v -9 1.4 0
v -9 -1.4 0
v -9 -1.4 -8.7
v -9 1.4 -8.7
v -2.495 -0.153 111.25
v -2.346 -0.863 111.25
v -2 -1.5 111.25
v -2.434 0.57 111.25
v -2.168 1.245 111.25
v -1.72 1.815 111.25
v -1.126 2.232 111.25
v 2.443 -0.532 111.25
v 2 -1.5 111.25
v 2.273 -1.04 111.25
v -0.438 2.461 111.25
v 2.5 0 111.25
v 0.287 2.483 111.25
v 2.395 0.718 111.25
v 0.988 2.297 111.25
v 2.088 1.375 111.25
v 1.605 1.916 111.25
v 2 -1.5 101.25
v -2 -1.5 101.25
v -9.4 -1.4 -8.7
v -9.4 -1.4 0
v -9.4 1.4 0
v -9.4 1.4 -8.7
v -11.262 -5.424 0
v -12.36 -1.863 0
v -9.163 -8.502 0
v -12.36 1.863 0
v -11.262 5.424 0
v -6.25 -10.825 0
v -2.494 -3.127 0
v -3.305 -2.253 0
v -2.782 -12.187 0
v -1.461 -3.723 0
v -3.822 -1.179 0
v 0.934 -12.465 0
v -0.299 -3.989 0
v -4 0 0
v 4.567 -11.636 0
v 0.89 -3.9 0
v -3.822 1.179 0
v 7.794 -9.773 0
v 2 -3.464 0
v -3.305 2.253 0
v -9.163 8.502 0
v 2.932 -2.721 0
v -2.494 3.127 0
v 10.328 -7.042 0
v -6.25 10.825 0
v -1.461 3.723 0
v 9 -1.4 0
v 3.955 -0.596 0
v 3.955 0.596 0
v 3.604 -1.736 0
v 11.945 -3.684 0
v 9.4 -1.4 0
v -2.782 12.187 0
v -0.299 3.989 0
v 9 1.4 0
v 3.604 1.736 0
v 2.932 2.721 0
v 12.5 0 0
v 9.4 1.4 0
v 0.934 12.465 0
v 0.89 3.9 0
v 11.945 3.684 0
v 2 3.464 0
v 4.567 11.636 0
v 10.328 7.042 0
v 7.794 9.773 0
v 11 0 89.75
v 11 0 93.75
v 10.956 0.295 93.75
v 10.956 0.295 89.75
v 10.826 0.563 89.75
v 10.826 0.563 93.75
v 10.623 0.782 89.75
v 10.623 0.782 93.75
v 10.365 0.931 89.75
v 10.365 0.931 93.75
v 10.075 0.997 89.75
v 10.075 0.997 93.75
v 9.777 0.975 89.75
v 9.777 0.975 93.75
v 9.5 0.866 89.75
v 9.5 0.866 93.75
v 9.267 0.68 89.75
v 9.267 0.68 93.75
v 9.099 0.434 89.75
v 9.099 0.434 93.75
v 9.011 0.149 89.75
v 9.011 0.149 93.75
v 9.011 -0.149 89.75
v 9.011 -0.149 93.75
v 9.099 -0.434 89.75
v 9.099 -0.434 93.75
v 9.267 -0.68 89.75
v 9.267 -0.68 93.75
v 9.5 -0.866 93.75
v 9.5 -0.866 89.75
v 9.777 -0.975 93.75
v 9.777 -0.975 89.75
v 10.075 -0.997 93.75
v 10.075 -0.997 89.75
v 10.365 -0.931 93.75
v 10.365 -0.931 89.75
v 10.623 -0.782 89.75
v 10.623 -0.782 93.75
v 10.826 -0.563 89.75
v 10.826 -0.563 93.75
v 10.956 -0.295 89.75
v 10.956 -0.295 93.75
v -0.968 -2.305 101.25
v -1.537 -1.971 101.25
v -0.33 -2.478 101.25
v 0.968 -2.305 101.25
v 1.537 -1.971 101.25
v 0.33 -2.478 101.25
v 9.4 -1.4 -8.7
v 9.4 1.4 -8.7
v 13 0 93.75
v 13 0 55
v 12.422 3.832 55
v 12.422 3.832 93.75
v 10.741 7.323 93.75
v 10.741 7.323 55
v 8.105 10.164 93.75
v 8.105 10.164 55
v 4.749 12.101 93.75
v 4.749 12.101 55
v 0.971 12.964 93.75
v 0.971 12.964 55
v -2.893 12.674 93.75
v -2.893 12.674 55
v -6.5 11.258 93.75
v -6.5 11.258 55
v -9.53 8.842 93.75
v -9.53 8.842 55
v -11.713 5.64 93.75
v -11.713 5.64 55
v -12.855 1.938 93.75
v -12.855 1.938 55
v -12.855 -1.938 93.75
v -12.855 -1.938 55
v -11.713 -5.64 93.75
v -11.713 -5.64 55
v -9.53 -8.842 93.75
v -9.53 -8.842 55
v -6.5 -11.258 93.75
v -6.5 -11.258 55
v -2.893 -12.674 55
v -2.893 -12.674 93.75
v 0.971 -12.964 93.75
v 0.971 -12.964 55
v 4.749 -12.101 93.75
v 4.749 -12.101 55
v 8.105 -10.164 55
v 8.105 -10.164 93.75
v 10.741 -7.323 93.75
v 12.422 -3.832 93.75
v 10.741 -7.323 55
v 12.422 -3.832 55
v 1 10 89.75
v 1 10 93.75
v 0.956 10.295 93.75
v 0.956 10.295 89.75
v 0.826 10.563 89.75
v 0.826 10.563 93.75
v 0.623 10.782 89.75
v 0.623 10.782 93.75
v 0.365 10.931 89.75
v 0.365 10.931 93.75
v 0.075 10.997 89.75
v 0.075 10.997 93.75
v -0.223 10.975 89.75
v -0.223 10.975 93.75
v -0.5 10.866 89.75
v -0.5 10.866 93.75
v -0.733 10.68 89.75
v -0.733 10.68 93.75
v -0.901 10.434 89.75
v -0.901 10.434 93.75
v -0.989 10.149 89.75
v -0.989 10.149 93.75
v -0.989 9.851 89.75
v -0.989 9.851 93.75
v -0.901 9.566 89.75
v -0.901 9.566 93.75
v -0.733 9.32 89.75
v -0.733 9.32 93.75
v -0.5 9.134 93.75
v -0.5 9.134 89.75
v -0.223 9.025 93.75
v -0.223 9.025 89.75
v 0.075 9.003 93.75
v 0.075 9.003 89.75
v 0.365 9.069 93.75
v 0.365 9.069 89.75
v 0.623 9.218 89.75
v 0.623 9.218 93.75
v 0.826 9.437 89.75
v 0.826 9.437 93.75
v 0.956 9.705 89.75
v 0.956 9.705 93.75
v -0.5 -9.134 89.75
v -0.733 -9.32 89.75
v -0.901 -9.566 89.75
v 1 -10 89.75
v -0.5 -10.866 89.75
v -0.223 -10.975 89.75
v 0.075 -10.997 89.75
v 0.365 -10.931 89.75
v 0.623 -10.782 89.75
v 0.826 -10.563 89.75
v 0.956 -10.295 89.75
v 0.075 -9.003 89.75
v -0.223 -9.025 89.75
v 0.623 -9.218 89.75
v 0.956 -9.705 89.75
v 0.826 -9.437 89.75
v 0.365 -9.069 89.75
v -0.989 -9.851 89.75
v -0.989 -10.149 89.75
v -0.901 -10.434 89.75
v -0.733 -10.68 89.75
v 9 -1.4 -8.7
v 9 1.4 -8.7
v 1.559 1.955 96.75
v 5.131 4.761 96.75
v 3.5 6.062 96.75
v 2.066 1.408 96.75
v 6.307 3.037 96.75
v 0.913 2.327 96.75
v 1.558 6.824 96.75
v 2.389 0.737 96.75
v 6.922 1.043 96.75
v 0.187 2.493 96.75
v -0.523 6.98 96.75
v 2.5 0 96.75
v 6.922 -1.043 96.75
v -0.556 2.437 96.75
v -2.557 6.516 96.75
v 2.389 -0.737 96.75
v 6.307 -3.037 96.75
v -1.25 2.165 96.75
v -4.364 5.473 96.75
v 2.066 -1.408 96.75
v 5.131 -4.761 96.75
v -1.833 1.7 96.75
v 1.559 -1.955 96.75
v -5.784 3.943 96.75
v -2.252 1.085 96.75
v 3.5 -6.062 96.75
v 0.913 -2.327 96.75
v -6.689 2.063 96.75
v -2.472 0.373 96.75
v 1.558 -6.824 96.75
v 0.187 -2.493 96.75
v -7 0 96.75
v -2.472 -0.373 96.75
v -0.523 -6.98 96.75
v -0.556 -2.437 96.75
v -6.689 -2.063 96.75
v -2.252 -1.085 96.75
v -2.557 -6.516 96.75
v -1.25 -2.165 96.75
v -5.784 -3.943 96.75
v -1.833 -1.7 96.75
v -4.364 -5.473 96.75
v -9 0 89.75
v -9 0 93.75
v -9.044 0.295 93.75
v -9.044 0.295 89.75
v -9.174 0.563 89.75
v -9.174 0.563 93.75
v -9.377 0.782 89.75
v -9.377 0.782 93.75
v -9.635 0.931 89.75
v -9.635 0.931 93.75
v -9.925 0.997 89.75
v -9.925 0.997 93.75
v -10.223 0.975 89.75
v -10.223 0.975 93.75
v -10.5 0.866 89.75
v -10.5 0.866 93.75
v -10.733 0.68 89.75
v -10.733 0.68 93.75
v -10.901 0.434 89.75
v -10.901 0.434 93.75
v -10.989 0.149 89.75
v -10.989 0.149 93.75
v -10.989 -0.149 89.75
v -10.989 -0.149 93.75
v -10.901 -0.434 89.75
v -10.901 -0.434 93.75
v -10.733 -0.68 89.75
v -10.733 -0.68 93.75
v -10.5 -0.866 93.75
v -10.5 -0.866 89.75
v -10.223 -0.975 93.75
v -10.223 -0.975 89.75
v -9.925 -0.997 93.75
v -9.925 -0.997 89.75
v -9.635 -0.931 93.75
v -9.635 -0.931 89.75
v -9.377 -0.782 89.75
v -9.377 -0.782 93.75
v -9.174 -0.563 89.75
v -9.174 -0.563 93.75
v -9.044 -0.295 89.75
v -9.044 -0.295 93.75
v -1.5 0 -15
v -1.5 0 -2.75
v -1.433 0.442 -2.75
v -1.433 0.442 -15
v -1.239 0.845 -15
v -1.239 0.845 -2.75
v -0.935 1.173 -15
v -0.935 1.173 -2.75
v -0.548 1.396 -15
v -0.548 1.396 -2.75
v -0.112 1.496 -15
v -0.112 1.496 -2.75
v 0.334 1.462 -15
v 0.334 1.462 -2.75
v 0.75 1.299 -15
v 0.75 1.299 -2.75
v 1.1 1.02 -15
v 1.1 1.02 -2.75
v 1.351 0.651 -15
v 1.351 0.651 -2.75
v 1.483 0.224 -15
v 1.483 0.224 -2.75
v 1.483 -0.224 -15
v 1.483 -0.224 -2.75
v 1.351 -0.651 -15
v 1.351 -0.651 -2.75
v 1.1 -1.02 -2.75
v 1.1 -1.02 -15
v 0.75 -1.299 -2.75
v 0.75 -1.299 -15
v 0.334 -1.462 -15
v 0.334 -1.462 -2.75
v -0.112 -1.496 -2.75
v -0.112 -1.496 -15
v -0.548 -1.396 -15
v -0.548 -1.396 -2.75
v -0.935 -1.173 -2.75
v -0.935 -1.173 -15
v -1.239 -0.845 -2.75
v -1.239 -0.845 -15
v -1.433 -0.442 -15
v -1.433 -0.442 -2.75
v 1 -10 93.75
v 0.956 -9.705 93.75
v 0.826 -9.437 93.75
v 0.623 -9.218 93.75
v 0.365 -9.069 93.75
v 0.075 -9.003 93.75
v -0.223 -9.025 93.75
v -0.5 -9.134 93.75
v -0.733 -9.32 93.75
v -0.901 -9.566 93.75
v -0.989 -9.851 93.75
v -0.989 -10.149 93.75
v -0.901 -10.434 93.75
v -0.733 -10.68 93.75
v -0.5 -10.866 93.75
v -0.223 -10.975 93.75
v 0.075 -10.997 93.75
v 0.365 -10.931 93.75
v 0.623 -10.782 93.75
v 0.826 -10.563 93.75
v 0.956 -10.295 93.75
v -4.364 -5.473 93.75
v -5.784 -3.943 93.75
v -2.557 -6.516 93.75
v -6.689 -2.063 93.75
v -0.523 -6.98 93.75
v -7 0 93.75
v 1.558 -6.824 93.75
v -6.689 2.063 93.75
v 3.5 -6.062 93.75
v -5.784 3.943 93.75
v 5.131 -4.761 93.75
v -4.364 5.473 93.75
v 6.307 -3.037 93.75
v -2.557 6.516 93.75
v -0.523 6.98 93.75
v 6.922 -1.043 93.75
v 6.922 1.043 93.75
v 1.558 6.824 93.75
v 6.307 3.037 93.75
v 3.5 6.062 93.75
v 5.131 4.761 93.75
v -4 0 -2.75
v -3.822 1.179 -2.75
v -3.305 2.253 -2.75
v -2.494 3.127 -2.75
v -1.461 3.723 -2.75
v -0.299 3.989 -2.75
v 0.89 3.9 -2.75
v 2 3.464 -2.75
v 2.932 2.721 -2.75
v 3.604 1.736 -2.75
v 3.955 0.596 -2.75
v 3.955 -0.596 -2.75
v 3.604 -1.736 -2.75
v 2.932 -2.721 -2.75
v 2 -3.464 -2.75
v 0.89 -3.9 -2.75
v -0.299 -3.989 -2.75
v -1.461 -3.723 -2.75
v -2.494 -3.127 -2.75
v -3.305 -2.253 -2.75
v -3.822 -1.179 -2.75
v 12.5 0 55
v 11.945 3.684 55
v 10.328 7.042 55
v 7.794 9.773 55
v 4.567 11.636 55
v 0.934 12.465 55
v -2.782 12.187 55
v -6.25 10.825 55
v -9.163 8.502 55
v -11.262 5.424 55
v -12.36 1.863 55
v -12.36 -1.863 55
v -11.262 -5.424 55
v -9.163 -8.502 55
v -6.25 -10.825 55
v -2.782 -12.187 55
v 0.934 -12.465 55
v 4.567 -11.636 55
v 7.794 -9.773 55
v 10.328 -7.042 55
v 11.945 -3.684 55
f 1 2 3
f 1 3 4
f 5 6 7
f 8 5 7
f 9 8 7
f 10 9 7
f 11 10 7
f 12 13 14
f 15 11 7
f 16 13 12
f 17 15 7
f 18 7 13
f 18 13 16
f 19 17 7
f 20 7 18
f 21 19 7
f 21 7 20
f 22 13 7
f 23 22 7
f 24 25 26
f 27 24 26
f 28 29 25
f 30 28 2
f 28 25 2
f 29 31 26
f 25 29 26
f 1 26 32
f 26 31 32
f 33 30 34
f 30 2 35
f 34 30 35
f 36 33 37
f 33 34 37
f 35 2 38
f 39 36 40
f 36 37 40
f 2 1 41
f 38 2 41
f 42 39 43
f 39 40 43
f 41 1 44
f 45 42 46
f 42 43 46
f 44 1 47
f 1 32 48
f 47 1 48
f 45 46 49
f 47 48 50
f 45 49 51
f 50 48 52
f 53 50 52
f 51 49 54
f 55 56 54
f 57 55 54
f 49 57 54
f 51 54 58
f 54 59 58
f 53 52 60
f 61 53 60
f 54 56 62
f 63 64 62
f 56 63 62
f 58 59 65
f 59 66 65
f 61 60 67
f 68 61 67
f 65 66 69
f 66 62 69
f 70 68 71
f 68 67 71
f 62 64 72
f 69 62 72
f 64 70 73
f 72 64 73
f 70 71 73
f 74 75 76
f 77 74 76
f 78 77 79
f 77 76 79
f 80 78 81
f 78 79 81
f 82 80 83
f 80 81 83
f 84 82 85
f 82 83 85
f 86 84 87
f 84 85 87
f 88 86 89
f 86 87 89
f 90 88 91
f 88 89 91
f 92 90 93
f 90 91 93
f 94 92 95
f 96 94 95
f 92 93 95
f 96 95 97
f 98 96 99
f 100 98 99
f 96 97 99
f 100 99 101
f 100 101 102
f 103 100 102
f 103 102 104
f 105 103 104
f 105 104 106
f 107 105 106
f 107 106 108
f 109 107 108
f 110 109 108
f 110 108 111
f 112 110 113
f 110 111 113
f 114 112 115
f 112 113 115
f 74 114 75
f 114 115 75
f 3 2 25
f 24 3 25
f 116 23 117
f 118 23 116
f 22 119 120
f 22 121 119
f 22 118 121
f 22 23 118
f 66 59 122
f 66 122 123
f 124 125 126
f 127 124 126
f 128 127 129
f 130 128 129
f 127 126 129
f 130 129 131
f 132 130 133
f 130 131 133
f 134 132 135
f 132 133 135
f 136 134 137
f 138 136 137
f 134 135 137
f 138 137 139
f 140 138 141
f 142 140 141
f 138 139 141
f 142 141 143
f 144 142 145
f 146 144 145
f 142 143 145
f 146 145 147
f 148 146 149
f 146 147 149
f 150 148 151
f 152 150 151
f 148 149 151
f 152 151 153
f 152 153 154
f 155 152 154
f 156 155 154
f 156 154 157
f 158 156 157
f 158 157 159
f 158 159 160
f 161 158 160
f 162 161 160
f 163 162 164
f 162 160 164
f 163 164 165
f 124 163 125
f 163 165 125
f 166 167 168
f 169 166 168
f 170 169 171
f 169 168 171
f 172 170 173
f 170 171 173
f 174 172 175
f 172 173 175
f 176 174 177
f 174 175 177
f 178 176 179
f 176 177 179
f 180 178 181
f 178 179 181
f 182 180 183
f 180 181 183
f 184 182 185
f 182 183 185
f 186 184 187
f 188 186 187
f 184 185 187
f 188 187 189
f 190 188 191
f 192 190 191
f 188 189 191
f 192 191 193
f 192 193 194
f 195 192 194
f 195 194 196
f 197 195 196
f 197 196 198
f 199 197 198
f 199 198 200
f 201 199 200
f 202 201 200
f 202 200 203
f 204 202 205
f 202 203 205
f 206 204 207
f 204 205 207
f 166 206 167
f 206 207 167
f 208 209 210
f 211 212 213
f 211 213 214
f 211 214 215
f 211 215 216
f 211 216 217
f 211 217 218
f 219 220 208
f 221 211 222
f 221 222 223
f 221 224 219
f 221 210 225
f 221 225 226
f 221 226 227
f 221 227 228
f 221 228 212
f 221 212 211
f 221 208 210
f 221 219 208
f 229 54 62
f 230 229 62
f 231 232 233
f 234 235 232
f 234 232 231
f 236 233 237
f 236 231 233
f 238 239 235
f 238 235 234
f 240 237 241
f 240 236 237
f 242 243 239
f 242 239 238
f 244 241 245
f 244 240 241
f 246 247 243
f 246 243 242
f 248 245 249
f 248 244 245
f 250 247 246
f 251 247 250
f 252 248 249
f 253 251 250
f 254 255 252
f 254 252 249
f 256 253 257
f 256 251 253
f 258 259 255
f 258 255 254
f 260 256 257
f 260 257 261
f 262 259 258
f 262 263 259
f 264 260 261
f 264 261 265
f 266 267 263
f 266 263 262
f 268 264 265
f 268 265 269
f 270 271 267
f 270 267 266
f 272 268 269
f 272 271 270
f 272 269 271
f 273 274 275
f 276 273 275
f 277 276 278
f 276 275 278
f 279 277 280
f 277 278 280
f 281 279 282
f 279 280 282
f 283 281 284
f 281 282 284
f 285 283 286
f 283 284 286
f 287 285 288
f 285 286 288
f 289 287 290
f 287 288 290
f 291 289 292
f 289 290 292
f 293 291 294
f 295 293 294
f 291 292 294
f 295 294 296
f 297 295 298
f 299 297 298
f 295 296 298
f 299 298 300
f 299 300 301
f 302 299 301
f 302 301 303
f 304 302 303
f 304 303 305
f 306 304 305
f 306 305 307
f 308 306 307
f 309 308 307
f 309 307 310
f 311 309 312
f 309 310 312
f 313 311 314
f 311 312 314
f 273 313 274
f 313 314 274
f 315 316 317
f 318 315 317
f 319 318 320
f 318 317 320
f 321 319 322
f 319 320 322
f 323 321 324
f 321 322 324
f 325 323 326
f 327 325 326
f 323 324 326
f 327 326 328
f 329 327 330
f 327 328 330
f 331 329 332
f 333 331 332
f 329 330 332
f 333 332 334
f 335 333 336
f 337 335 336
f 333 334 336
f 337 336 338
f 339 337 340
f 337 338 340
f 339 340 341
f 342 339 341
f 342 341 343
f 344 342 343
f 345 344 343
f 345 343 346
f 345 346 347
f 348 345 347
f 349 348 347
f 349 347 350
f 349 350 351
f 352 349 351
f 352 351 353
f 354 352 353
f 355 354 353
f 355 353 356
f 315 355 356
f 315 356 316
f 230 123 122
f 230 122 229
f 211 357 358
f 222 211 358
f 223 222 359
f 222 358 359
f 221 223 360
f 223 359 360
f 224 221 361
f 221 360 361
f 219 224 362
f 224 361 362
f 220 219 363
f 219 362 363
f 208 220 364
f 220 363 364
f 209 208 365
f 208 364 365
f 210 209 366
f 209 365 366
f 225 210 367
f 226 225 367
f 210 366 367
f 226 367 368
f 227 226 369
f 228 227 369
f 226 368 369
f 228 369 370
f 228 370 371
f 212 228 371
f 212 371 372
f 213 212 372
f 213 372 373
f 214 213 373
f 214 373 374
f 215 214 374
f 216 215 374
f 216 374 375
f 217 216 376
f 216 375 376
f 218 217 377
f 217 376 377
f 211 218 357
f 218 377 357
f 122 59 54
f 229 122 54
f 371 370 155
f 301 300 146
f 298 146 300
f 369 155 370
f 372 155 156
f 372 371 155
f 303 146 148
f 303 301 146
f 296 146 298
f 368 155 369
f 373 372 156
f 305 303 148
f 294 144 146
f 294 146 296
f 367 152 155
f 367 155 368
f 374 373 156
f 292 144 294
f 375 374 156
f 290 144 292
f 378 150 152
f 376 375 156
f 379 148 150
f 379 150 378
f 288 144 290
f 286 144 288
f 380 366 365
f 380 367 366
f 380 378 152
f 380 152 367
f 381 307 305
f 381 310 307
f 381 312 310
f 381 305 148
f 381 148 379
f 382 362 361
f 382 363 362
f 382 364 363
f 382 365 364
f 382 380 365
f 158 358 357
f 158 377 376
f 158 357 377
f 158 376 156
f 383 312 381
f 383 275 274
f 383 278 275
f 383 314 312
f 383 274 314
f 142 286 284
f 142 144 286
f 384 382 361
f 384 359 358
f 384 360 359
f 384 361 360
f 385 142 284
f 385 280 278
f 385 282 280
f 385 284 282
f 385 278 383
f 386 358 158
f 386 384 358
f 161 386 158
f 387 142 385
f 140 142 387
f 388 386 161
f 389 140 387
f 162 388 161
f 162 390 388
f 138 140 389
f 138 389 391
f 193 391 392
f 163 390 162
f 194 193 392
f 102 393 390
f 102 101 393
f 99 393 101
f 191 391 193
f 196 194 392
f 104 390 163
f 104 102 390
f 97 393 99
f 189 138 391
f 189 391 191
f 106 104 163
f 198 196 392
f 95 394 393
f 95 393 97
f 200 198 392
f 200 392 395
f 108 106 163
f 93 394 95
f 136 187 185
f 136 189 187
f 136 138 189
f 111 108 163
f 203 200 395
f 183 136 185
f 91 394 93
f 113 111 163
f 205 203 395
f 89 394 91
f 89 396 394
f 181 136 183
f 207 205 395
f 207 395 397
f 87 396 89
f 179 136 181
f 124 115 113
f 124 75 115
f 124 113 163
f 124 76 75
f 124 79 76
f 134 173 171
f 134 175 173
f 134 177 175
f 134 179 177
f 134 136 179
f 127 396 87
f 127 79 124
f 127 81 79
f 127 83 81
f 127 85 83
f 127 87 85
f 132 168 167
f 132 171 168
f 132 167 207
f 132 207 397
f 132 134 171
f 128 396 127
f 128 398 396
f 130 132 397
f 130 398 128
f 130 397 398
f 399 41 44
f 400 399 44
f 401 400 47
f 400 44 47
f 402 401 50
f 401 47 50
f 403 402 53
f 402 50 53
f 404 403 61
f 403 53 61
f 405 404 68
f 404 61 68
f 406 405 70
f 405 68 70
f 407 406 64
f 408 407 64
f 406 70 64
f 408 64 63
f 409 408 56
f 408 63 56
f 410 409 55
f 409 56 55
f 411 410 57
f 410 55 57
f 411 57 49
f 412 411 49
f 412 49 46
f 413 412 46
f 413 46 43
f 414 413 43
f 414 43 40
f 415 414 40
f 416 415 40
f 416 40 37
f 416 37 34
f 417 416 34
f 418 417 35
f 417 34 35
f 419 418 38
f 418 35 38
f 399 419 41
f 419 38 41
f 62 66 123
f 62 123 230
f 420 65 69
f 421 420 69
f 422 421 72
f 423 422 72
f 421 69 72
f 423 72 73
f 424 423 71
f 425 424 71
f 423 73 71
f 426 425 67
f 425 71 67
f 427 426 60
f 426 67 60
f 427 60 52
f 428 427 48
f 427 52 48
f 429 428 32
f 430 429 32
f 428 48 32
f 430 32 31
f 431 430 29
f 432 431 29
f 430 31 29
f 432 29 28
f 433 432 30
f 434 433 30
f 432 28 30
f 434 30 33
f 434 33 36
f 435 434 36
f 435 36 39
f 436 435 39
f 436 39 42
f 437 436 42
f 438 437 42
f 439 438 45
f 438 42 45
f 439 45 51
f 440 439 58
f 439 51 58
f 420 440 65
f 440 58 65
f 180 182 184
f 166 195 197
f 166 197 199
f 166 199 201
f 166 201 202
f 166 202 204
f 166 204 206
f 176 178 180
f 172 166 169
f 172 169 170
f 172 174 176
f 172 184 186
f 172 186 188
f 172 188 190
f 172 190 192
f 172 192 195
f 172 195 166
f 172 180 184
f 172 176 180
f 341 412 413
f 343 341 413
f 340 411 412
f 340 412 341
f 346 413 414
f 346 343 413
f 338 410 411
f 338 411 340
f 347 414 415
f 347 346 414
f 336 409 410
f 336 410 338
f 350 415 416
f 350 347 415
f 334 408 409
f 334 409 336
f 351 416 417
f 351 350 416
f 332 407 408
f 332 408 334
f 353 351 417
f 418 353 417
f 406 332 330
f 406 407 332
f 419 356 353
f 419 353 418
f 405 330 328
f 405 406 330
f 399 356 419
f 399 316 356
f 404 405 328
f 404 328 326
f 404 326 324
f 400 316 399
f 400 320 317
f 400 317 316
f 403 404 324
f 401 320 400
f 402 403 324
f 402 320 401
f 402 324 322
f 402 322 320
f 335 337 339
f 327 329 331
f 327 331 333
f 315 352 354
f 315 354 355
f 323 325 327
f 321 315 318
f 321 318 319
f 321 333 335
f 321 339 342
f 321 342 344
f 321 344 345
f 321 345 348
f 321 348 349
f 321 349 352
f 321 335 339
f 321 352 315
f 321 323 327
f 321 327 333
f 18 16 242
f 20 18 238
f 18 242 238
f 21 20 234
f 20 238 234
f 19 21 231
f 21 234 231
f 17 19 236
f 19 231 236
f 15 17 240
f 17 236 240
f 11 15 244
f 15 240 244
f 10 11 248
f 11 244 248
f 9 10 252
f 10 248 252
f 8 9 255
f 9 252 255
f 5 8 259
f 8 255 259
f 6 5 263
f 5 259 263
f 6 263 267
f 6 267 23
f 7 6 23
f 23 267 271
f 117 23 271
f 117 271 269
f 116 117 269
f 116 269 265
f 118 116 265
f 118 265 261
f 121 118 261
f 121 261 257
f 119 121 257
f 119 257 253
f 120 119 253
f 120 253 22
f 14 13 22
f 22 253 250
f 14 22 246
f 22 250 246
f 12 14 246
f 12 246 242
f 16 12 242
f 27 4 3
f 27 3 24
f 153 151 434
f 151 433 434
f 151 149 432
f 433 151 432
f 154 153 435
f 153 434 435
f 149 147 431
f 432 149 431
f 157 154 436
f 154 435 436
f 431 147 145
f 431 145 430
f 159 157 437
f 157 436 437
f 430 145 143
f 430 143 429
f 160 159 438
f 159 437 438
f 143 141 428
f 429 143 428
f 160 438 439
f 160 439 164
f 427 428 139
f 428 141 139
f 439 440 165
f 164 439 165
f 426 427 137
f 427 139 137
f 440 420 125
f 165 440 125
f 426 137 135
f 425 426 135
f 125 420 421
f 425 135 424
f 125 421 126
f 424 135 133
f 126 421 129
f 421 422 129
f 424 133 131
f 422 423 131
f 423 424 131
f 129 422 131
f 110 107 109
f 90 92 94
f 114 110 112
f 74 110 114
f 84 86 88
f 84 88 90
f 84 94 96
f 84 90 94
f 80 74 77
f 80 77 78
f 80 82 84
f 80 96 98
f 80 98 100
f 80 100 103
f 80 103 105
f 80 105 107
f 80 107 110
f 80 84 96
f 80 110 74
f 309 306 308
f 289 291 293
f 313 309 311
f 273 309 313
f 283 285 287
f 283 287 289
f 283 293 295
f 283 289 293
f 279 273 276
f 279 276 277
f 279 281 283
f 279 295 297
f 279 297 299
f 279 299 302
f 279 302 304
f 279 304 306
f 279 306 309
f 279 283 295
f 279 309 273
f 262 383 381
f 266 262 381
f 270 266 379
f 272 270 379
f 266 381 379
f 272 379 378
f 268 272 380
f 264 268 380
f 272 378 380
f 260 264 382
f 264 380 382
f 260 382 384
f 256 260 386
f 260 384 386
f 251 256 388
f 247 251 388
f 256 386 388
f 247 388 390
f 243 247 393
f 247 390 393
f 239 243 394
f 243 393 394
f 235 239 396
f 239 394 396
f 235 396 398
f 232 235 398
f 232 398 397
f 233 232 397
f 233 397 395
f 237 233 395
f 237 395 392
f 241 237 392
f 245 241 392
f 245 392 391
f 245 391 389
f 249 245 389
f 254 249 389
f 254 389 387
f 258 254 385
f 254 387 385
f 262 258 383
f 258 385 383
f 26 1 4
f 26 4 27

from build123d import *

# Parameters (mm, degrees)
SKETCH1_R          = 12.5
EXTRUSION1_DEPTH   = 55
SKETCH2_R          = 13
EXTRUSION2_DEPTH   = 38.75
SKETCH3_R          = 7
EXTRUSION3_DEPTH   = 3
SKETCH4_R          = 2.5
EXTRUSION4_DEPTH   = 14.5
SKETCH5_R          = 1
EXTRUSION5_DEPTH   = 4
SKETCH6_R          = 4
EXTRUSION6_DEPTH   = 2.75
SKETCH7_R          = 1.5
EXTRUSION7_DEPTH   = 15
SKETCH8_W          = 0.4
SKETCH8_H          = 2.8
EXTRUSION8_DEPTH   = 8.7
CUT_EXTRUDE1_DEPTH = 10


with BuildPart() as part:
    # Sketch1 → Extrusion1 (new body)
    with BuildSketch(Plane.XY):
        Circle(SKETCH1_R)
    extrude(amount=EXTRUSION1_DEPTH)

    # Sketch2 → Extrusion2 (add)
    with BuildSketch(Plane.XY.offset(55)):
        Circle(SKETCH2_R)
    extrude(amount=EXTRUSION2_DEPTH)

    # Sketch3 → Extrusion3 (add)
    with BuildSketch(Plane.XY.offset(93.75)):
        with Locations(Location((0, 0, 0), (0, 0, 180))):
            Circle(SKETCH3_R)
    extrude(amount=EXTRUSION3_DEPTH)

    # Sketch4 → Extrusion4 (add)
    with BuildSketch(Plane.XY.offset(96.75)):
        Circle(SKETCH4_R)
    extrude(amount=EXTRUSION4_DEPTH)

    # Sketch5 → Extrusion5 (cut)
    with BuildSketch(Plane.XY.offset(93.75)):
        with Locations((0, 10)):
            Circle(SKETCH5_R)
        with Locations((10, 0)):
            Circle(SKETCH5_R)
        with Locations((0, -10)):
            Circle(SKETCH5_R)
        with Locations((-10, 0)):
            Circle(SKETCH5_R)
    extrude(amount=-EXTRUSION5_DEPTH, mode=Mode.SUBTRACT)

    # Sketch6 → Extrusion6 (add)
    with BuildSketch(Plane(origin=(0, 0, 0), x_dir=(-1, 0, 0), z_dir=(0, 0, -1))):
        Circle(SKETCH6_R)
    extrude(amount=EXTRUSION6_DEPTH)

    # Sketch7 → Extrusion7 (add)
    with BuildSketch(Plane(origin=(0, 0, 0), x_dir=(-1, 0, 0), z_dir=(0, 0, -1))):
        Circle(SKETCH7_R)
    extrude(amount=EXTRUSION7_DEPTH)

    # Sketch8 → Extrusion8 (add)
    with BuildSketch(Plane(origin=(0, 0, 0), x_dir=(-1, 0, 0), z_dir=(0, 0, -1))):
        with Locations((9.2, 0)):
            Rectangle(SKETCH8_W, SKETCH8_H)
        with Locations((-9.2, 0)):
            Rectangle(SKETCH8_W, SKETCH8_H)
    extrude(amount=EXTRUSION8_DEPTH)

    # Sketch9 → Cut-Extrude1 (cut)
    with BuildSketch(Plane.XY.offset(111.25)):
        Polygon((53.72529209, -1.5), (2, -1.5), (-2, -1.5), (-53.72529209, -1.5), (-53.72529209, -104.95058418), (53.72529209, -104.95058418), align=None)
    extrude(amount=-CUT_EXTRUDE1_DEPTH, mode=Mode.SUBTRACT)


solid = part.part
